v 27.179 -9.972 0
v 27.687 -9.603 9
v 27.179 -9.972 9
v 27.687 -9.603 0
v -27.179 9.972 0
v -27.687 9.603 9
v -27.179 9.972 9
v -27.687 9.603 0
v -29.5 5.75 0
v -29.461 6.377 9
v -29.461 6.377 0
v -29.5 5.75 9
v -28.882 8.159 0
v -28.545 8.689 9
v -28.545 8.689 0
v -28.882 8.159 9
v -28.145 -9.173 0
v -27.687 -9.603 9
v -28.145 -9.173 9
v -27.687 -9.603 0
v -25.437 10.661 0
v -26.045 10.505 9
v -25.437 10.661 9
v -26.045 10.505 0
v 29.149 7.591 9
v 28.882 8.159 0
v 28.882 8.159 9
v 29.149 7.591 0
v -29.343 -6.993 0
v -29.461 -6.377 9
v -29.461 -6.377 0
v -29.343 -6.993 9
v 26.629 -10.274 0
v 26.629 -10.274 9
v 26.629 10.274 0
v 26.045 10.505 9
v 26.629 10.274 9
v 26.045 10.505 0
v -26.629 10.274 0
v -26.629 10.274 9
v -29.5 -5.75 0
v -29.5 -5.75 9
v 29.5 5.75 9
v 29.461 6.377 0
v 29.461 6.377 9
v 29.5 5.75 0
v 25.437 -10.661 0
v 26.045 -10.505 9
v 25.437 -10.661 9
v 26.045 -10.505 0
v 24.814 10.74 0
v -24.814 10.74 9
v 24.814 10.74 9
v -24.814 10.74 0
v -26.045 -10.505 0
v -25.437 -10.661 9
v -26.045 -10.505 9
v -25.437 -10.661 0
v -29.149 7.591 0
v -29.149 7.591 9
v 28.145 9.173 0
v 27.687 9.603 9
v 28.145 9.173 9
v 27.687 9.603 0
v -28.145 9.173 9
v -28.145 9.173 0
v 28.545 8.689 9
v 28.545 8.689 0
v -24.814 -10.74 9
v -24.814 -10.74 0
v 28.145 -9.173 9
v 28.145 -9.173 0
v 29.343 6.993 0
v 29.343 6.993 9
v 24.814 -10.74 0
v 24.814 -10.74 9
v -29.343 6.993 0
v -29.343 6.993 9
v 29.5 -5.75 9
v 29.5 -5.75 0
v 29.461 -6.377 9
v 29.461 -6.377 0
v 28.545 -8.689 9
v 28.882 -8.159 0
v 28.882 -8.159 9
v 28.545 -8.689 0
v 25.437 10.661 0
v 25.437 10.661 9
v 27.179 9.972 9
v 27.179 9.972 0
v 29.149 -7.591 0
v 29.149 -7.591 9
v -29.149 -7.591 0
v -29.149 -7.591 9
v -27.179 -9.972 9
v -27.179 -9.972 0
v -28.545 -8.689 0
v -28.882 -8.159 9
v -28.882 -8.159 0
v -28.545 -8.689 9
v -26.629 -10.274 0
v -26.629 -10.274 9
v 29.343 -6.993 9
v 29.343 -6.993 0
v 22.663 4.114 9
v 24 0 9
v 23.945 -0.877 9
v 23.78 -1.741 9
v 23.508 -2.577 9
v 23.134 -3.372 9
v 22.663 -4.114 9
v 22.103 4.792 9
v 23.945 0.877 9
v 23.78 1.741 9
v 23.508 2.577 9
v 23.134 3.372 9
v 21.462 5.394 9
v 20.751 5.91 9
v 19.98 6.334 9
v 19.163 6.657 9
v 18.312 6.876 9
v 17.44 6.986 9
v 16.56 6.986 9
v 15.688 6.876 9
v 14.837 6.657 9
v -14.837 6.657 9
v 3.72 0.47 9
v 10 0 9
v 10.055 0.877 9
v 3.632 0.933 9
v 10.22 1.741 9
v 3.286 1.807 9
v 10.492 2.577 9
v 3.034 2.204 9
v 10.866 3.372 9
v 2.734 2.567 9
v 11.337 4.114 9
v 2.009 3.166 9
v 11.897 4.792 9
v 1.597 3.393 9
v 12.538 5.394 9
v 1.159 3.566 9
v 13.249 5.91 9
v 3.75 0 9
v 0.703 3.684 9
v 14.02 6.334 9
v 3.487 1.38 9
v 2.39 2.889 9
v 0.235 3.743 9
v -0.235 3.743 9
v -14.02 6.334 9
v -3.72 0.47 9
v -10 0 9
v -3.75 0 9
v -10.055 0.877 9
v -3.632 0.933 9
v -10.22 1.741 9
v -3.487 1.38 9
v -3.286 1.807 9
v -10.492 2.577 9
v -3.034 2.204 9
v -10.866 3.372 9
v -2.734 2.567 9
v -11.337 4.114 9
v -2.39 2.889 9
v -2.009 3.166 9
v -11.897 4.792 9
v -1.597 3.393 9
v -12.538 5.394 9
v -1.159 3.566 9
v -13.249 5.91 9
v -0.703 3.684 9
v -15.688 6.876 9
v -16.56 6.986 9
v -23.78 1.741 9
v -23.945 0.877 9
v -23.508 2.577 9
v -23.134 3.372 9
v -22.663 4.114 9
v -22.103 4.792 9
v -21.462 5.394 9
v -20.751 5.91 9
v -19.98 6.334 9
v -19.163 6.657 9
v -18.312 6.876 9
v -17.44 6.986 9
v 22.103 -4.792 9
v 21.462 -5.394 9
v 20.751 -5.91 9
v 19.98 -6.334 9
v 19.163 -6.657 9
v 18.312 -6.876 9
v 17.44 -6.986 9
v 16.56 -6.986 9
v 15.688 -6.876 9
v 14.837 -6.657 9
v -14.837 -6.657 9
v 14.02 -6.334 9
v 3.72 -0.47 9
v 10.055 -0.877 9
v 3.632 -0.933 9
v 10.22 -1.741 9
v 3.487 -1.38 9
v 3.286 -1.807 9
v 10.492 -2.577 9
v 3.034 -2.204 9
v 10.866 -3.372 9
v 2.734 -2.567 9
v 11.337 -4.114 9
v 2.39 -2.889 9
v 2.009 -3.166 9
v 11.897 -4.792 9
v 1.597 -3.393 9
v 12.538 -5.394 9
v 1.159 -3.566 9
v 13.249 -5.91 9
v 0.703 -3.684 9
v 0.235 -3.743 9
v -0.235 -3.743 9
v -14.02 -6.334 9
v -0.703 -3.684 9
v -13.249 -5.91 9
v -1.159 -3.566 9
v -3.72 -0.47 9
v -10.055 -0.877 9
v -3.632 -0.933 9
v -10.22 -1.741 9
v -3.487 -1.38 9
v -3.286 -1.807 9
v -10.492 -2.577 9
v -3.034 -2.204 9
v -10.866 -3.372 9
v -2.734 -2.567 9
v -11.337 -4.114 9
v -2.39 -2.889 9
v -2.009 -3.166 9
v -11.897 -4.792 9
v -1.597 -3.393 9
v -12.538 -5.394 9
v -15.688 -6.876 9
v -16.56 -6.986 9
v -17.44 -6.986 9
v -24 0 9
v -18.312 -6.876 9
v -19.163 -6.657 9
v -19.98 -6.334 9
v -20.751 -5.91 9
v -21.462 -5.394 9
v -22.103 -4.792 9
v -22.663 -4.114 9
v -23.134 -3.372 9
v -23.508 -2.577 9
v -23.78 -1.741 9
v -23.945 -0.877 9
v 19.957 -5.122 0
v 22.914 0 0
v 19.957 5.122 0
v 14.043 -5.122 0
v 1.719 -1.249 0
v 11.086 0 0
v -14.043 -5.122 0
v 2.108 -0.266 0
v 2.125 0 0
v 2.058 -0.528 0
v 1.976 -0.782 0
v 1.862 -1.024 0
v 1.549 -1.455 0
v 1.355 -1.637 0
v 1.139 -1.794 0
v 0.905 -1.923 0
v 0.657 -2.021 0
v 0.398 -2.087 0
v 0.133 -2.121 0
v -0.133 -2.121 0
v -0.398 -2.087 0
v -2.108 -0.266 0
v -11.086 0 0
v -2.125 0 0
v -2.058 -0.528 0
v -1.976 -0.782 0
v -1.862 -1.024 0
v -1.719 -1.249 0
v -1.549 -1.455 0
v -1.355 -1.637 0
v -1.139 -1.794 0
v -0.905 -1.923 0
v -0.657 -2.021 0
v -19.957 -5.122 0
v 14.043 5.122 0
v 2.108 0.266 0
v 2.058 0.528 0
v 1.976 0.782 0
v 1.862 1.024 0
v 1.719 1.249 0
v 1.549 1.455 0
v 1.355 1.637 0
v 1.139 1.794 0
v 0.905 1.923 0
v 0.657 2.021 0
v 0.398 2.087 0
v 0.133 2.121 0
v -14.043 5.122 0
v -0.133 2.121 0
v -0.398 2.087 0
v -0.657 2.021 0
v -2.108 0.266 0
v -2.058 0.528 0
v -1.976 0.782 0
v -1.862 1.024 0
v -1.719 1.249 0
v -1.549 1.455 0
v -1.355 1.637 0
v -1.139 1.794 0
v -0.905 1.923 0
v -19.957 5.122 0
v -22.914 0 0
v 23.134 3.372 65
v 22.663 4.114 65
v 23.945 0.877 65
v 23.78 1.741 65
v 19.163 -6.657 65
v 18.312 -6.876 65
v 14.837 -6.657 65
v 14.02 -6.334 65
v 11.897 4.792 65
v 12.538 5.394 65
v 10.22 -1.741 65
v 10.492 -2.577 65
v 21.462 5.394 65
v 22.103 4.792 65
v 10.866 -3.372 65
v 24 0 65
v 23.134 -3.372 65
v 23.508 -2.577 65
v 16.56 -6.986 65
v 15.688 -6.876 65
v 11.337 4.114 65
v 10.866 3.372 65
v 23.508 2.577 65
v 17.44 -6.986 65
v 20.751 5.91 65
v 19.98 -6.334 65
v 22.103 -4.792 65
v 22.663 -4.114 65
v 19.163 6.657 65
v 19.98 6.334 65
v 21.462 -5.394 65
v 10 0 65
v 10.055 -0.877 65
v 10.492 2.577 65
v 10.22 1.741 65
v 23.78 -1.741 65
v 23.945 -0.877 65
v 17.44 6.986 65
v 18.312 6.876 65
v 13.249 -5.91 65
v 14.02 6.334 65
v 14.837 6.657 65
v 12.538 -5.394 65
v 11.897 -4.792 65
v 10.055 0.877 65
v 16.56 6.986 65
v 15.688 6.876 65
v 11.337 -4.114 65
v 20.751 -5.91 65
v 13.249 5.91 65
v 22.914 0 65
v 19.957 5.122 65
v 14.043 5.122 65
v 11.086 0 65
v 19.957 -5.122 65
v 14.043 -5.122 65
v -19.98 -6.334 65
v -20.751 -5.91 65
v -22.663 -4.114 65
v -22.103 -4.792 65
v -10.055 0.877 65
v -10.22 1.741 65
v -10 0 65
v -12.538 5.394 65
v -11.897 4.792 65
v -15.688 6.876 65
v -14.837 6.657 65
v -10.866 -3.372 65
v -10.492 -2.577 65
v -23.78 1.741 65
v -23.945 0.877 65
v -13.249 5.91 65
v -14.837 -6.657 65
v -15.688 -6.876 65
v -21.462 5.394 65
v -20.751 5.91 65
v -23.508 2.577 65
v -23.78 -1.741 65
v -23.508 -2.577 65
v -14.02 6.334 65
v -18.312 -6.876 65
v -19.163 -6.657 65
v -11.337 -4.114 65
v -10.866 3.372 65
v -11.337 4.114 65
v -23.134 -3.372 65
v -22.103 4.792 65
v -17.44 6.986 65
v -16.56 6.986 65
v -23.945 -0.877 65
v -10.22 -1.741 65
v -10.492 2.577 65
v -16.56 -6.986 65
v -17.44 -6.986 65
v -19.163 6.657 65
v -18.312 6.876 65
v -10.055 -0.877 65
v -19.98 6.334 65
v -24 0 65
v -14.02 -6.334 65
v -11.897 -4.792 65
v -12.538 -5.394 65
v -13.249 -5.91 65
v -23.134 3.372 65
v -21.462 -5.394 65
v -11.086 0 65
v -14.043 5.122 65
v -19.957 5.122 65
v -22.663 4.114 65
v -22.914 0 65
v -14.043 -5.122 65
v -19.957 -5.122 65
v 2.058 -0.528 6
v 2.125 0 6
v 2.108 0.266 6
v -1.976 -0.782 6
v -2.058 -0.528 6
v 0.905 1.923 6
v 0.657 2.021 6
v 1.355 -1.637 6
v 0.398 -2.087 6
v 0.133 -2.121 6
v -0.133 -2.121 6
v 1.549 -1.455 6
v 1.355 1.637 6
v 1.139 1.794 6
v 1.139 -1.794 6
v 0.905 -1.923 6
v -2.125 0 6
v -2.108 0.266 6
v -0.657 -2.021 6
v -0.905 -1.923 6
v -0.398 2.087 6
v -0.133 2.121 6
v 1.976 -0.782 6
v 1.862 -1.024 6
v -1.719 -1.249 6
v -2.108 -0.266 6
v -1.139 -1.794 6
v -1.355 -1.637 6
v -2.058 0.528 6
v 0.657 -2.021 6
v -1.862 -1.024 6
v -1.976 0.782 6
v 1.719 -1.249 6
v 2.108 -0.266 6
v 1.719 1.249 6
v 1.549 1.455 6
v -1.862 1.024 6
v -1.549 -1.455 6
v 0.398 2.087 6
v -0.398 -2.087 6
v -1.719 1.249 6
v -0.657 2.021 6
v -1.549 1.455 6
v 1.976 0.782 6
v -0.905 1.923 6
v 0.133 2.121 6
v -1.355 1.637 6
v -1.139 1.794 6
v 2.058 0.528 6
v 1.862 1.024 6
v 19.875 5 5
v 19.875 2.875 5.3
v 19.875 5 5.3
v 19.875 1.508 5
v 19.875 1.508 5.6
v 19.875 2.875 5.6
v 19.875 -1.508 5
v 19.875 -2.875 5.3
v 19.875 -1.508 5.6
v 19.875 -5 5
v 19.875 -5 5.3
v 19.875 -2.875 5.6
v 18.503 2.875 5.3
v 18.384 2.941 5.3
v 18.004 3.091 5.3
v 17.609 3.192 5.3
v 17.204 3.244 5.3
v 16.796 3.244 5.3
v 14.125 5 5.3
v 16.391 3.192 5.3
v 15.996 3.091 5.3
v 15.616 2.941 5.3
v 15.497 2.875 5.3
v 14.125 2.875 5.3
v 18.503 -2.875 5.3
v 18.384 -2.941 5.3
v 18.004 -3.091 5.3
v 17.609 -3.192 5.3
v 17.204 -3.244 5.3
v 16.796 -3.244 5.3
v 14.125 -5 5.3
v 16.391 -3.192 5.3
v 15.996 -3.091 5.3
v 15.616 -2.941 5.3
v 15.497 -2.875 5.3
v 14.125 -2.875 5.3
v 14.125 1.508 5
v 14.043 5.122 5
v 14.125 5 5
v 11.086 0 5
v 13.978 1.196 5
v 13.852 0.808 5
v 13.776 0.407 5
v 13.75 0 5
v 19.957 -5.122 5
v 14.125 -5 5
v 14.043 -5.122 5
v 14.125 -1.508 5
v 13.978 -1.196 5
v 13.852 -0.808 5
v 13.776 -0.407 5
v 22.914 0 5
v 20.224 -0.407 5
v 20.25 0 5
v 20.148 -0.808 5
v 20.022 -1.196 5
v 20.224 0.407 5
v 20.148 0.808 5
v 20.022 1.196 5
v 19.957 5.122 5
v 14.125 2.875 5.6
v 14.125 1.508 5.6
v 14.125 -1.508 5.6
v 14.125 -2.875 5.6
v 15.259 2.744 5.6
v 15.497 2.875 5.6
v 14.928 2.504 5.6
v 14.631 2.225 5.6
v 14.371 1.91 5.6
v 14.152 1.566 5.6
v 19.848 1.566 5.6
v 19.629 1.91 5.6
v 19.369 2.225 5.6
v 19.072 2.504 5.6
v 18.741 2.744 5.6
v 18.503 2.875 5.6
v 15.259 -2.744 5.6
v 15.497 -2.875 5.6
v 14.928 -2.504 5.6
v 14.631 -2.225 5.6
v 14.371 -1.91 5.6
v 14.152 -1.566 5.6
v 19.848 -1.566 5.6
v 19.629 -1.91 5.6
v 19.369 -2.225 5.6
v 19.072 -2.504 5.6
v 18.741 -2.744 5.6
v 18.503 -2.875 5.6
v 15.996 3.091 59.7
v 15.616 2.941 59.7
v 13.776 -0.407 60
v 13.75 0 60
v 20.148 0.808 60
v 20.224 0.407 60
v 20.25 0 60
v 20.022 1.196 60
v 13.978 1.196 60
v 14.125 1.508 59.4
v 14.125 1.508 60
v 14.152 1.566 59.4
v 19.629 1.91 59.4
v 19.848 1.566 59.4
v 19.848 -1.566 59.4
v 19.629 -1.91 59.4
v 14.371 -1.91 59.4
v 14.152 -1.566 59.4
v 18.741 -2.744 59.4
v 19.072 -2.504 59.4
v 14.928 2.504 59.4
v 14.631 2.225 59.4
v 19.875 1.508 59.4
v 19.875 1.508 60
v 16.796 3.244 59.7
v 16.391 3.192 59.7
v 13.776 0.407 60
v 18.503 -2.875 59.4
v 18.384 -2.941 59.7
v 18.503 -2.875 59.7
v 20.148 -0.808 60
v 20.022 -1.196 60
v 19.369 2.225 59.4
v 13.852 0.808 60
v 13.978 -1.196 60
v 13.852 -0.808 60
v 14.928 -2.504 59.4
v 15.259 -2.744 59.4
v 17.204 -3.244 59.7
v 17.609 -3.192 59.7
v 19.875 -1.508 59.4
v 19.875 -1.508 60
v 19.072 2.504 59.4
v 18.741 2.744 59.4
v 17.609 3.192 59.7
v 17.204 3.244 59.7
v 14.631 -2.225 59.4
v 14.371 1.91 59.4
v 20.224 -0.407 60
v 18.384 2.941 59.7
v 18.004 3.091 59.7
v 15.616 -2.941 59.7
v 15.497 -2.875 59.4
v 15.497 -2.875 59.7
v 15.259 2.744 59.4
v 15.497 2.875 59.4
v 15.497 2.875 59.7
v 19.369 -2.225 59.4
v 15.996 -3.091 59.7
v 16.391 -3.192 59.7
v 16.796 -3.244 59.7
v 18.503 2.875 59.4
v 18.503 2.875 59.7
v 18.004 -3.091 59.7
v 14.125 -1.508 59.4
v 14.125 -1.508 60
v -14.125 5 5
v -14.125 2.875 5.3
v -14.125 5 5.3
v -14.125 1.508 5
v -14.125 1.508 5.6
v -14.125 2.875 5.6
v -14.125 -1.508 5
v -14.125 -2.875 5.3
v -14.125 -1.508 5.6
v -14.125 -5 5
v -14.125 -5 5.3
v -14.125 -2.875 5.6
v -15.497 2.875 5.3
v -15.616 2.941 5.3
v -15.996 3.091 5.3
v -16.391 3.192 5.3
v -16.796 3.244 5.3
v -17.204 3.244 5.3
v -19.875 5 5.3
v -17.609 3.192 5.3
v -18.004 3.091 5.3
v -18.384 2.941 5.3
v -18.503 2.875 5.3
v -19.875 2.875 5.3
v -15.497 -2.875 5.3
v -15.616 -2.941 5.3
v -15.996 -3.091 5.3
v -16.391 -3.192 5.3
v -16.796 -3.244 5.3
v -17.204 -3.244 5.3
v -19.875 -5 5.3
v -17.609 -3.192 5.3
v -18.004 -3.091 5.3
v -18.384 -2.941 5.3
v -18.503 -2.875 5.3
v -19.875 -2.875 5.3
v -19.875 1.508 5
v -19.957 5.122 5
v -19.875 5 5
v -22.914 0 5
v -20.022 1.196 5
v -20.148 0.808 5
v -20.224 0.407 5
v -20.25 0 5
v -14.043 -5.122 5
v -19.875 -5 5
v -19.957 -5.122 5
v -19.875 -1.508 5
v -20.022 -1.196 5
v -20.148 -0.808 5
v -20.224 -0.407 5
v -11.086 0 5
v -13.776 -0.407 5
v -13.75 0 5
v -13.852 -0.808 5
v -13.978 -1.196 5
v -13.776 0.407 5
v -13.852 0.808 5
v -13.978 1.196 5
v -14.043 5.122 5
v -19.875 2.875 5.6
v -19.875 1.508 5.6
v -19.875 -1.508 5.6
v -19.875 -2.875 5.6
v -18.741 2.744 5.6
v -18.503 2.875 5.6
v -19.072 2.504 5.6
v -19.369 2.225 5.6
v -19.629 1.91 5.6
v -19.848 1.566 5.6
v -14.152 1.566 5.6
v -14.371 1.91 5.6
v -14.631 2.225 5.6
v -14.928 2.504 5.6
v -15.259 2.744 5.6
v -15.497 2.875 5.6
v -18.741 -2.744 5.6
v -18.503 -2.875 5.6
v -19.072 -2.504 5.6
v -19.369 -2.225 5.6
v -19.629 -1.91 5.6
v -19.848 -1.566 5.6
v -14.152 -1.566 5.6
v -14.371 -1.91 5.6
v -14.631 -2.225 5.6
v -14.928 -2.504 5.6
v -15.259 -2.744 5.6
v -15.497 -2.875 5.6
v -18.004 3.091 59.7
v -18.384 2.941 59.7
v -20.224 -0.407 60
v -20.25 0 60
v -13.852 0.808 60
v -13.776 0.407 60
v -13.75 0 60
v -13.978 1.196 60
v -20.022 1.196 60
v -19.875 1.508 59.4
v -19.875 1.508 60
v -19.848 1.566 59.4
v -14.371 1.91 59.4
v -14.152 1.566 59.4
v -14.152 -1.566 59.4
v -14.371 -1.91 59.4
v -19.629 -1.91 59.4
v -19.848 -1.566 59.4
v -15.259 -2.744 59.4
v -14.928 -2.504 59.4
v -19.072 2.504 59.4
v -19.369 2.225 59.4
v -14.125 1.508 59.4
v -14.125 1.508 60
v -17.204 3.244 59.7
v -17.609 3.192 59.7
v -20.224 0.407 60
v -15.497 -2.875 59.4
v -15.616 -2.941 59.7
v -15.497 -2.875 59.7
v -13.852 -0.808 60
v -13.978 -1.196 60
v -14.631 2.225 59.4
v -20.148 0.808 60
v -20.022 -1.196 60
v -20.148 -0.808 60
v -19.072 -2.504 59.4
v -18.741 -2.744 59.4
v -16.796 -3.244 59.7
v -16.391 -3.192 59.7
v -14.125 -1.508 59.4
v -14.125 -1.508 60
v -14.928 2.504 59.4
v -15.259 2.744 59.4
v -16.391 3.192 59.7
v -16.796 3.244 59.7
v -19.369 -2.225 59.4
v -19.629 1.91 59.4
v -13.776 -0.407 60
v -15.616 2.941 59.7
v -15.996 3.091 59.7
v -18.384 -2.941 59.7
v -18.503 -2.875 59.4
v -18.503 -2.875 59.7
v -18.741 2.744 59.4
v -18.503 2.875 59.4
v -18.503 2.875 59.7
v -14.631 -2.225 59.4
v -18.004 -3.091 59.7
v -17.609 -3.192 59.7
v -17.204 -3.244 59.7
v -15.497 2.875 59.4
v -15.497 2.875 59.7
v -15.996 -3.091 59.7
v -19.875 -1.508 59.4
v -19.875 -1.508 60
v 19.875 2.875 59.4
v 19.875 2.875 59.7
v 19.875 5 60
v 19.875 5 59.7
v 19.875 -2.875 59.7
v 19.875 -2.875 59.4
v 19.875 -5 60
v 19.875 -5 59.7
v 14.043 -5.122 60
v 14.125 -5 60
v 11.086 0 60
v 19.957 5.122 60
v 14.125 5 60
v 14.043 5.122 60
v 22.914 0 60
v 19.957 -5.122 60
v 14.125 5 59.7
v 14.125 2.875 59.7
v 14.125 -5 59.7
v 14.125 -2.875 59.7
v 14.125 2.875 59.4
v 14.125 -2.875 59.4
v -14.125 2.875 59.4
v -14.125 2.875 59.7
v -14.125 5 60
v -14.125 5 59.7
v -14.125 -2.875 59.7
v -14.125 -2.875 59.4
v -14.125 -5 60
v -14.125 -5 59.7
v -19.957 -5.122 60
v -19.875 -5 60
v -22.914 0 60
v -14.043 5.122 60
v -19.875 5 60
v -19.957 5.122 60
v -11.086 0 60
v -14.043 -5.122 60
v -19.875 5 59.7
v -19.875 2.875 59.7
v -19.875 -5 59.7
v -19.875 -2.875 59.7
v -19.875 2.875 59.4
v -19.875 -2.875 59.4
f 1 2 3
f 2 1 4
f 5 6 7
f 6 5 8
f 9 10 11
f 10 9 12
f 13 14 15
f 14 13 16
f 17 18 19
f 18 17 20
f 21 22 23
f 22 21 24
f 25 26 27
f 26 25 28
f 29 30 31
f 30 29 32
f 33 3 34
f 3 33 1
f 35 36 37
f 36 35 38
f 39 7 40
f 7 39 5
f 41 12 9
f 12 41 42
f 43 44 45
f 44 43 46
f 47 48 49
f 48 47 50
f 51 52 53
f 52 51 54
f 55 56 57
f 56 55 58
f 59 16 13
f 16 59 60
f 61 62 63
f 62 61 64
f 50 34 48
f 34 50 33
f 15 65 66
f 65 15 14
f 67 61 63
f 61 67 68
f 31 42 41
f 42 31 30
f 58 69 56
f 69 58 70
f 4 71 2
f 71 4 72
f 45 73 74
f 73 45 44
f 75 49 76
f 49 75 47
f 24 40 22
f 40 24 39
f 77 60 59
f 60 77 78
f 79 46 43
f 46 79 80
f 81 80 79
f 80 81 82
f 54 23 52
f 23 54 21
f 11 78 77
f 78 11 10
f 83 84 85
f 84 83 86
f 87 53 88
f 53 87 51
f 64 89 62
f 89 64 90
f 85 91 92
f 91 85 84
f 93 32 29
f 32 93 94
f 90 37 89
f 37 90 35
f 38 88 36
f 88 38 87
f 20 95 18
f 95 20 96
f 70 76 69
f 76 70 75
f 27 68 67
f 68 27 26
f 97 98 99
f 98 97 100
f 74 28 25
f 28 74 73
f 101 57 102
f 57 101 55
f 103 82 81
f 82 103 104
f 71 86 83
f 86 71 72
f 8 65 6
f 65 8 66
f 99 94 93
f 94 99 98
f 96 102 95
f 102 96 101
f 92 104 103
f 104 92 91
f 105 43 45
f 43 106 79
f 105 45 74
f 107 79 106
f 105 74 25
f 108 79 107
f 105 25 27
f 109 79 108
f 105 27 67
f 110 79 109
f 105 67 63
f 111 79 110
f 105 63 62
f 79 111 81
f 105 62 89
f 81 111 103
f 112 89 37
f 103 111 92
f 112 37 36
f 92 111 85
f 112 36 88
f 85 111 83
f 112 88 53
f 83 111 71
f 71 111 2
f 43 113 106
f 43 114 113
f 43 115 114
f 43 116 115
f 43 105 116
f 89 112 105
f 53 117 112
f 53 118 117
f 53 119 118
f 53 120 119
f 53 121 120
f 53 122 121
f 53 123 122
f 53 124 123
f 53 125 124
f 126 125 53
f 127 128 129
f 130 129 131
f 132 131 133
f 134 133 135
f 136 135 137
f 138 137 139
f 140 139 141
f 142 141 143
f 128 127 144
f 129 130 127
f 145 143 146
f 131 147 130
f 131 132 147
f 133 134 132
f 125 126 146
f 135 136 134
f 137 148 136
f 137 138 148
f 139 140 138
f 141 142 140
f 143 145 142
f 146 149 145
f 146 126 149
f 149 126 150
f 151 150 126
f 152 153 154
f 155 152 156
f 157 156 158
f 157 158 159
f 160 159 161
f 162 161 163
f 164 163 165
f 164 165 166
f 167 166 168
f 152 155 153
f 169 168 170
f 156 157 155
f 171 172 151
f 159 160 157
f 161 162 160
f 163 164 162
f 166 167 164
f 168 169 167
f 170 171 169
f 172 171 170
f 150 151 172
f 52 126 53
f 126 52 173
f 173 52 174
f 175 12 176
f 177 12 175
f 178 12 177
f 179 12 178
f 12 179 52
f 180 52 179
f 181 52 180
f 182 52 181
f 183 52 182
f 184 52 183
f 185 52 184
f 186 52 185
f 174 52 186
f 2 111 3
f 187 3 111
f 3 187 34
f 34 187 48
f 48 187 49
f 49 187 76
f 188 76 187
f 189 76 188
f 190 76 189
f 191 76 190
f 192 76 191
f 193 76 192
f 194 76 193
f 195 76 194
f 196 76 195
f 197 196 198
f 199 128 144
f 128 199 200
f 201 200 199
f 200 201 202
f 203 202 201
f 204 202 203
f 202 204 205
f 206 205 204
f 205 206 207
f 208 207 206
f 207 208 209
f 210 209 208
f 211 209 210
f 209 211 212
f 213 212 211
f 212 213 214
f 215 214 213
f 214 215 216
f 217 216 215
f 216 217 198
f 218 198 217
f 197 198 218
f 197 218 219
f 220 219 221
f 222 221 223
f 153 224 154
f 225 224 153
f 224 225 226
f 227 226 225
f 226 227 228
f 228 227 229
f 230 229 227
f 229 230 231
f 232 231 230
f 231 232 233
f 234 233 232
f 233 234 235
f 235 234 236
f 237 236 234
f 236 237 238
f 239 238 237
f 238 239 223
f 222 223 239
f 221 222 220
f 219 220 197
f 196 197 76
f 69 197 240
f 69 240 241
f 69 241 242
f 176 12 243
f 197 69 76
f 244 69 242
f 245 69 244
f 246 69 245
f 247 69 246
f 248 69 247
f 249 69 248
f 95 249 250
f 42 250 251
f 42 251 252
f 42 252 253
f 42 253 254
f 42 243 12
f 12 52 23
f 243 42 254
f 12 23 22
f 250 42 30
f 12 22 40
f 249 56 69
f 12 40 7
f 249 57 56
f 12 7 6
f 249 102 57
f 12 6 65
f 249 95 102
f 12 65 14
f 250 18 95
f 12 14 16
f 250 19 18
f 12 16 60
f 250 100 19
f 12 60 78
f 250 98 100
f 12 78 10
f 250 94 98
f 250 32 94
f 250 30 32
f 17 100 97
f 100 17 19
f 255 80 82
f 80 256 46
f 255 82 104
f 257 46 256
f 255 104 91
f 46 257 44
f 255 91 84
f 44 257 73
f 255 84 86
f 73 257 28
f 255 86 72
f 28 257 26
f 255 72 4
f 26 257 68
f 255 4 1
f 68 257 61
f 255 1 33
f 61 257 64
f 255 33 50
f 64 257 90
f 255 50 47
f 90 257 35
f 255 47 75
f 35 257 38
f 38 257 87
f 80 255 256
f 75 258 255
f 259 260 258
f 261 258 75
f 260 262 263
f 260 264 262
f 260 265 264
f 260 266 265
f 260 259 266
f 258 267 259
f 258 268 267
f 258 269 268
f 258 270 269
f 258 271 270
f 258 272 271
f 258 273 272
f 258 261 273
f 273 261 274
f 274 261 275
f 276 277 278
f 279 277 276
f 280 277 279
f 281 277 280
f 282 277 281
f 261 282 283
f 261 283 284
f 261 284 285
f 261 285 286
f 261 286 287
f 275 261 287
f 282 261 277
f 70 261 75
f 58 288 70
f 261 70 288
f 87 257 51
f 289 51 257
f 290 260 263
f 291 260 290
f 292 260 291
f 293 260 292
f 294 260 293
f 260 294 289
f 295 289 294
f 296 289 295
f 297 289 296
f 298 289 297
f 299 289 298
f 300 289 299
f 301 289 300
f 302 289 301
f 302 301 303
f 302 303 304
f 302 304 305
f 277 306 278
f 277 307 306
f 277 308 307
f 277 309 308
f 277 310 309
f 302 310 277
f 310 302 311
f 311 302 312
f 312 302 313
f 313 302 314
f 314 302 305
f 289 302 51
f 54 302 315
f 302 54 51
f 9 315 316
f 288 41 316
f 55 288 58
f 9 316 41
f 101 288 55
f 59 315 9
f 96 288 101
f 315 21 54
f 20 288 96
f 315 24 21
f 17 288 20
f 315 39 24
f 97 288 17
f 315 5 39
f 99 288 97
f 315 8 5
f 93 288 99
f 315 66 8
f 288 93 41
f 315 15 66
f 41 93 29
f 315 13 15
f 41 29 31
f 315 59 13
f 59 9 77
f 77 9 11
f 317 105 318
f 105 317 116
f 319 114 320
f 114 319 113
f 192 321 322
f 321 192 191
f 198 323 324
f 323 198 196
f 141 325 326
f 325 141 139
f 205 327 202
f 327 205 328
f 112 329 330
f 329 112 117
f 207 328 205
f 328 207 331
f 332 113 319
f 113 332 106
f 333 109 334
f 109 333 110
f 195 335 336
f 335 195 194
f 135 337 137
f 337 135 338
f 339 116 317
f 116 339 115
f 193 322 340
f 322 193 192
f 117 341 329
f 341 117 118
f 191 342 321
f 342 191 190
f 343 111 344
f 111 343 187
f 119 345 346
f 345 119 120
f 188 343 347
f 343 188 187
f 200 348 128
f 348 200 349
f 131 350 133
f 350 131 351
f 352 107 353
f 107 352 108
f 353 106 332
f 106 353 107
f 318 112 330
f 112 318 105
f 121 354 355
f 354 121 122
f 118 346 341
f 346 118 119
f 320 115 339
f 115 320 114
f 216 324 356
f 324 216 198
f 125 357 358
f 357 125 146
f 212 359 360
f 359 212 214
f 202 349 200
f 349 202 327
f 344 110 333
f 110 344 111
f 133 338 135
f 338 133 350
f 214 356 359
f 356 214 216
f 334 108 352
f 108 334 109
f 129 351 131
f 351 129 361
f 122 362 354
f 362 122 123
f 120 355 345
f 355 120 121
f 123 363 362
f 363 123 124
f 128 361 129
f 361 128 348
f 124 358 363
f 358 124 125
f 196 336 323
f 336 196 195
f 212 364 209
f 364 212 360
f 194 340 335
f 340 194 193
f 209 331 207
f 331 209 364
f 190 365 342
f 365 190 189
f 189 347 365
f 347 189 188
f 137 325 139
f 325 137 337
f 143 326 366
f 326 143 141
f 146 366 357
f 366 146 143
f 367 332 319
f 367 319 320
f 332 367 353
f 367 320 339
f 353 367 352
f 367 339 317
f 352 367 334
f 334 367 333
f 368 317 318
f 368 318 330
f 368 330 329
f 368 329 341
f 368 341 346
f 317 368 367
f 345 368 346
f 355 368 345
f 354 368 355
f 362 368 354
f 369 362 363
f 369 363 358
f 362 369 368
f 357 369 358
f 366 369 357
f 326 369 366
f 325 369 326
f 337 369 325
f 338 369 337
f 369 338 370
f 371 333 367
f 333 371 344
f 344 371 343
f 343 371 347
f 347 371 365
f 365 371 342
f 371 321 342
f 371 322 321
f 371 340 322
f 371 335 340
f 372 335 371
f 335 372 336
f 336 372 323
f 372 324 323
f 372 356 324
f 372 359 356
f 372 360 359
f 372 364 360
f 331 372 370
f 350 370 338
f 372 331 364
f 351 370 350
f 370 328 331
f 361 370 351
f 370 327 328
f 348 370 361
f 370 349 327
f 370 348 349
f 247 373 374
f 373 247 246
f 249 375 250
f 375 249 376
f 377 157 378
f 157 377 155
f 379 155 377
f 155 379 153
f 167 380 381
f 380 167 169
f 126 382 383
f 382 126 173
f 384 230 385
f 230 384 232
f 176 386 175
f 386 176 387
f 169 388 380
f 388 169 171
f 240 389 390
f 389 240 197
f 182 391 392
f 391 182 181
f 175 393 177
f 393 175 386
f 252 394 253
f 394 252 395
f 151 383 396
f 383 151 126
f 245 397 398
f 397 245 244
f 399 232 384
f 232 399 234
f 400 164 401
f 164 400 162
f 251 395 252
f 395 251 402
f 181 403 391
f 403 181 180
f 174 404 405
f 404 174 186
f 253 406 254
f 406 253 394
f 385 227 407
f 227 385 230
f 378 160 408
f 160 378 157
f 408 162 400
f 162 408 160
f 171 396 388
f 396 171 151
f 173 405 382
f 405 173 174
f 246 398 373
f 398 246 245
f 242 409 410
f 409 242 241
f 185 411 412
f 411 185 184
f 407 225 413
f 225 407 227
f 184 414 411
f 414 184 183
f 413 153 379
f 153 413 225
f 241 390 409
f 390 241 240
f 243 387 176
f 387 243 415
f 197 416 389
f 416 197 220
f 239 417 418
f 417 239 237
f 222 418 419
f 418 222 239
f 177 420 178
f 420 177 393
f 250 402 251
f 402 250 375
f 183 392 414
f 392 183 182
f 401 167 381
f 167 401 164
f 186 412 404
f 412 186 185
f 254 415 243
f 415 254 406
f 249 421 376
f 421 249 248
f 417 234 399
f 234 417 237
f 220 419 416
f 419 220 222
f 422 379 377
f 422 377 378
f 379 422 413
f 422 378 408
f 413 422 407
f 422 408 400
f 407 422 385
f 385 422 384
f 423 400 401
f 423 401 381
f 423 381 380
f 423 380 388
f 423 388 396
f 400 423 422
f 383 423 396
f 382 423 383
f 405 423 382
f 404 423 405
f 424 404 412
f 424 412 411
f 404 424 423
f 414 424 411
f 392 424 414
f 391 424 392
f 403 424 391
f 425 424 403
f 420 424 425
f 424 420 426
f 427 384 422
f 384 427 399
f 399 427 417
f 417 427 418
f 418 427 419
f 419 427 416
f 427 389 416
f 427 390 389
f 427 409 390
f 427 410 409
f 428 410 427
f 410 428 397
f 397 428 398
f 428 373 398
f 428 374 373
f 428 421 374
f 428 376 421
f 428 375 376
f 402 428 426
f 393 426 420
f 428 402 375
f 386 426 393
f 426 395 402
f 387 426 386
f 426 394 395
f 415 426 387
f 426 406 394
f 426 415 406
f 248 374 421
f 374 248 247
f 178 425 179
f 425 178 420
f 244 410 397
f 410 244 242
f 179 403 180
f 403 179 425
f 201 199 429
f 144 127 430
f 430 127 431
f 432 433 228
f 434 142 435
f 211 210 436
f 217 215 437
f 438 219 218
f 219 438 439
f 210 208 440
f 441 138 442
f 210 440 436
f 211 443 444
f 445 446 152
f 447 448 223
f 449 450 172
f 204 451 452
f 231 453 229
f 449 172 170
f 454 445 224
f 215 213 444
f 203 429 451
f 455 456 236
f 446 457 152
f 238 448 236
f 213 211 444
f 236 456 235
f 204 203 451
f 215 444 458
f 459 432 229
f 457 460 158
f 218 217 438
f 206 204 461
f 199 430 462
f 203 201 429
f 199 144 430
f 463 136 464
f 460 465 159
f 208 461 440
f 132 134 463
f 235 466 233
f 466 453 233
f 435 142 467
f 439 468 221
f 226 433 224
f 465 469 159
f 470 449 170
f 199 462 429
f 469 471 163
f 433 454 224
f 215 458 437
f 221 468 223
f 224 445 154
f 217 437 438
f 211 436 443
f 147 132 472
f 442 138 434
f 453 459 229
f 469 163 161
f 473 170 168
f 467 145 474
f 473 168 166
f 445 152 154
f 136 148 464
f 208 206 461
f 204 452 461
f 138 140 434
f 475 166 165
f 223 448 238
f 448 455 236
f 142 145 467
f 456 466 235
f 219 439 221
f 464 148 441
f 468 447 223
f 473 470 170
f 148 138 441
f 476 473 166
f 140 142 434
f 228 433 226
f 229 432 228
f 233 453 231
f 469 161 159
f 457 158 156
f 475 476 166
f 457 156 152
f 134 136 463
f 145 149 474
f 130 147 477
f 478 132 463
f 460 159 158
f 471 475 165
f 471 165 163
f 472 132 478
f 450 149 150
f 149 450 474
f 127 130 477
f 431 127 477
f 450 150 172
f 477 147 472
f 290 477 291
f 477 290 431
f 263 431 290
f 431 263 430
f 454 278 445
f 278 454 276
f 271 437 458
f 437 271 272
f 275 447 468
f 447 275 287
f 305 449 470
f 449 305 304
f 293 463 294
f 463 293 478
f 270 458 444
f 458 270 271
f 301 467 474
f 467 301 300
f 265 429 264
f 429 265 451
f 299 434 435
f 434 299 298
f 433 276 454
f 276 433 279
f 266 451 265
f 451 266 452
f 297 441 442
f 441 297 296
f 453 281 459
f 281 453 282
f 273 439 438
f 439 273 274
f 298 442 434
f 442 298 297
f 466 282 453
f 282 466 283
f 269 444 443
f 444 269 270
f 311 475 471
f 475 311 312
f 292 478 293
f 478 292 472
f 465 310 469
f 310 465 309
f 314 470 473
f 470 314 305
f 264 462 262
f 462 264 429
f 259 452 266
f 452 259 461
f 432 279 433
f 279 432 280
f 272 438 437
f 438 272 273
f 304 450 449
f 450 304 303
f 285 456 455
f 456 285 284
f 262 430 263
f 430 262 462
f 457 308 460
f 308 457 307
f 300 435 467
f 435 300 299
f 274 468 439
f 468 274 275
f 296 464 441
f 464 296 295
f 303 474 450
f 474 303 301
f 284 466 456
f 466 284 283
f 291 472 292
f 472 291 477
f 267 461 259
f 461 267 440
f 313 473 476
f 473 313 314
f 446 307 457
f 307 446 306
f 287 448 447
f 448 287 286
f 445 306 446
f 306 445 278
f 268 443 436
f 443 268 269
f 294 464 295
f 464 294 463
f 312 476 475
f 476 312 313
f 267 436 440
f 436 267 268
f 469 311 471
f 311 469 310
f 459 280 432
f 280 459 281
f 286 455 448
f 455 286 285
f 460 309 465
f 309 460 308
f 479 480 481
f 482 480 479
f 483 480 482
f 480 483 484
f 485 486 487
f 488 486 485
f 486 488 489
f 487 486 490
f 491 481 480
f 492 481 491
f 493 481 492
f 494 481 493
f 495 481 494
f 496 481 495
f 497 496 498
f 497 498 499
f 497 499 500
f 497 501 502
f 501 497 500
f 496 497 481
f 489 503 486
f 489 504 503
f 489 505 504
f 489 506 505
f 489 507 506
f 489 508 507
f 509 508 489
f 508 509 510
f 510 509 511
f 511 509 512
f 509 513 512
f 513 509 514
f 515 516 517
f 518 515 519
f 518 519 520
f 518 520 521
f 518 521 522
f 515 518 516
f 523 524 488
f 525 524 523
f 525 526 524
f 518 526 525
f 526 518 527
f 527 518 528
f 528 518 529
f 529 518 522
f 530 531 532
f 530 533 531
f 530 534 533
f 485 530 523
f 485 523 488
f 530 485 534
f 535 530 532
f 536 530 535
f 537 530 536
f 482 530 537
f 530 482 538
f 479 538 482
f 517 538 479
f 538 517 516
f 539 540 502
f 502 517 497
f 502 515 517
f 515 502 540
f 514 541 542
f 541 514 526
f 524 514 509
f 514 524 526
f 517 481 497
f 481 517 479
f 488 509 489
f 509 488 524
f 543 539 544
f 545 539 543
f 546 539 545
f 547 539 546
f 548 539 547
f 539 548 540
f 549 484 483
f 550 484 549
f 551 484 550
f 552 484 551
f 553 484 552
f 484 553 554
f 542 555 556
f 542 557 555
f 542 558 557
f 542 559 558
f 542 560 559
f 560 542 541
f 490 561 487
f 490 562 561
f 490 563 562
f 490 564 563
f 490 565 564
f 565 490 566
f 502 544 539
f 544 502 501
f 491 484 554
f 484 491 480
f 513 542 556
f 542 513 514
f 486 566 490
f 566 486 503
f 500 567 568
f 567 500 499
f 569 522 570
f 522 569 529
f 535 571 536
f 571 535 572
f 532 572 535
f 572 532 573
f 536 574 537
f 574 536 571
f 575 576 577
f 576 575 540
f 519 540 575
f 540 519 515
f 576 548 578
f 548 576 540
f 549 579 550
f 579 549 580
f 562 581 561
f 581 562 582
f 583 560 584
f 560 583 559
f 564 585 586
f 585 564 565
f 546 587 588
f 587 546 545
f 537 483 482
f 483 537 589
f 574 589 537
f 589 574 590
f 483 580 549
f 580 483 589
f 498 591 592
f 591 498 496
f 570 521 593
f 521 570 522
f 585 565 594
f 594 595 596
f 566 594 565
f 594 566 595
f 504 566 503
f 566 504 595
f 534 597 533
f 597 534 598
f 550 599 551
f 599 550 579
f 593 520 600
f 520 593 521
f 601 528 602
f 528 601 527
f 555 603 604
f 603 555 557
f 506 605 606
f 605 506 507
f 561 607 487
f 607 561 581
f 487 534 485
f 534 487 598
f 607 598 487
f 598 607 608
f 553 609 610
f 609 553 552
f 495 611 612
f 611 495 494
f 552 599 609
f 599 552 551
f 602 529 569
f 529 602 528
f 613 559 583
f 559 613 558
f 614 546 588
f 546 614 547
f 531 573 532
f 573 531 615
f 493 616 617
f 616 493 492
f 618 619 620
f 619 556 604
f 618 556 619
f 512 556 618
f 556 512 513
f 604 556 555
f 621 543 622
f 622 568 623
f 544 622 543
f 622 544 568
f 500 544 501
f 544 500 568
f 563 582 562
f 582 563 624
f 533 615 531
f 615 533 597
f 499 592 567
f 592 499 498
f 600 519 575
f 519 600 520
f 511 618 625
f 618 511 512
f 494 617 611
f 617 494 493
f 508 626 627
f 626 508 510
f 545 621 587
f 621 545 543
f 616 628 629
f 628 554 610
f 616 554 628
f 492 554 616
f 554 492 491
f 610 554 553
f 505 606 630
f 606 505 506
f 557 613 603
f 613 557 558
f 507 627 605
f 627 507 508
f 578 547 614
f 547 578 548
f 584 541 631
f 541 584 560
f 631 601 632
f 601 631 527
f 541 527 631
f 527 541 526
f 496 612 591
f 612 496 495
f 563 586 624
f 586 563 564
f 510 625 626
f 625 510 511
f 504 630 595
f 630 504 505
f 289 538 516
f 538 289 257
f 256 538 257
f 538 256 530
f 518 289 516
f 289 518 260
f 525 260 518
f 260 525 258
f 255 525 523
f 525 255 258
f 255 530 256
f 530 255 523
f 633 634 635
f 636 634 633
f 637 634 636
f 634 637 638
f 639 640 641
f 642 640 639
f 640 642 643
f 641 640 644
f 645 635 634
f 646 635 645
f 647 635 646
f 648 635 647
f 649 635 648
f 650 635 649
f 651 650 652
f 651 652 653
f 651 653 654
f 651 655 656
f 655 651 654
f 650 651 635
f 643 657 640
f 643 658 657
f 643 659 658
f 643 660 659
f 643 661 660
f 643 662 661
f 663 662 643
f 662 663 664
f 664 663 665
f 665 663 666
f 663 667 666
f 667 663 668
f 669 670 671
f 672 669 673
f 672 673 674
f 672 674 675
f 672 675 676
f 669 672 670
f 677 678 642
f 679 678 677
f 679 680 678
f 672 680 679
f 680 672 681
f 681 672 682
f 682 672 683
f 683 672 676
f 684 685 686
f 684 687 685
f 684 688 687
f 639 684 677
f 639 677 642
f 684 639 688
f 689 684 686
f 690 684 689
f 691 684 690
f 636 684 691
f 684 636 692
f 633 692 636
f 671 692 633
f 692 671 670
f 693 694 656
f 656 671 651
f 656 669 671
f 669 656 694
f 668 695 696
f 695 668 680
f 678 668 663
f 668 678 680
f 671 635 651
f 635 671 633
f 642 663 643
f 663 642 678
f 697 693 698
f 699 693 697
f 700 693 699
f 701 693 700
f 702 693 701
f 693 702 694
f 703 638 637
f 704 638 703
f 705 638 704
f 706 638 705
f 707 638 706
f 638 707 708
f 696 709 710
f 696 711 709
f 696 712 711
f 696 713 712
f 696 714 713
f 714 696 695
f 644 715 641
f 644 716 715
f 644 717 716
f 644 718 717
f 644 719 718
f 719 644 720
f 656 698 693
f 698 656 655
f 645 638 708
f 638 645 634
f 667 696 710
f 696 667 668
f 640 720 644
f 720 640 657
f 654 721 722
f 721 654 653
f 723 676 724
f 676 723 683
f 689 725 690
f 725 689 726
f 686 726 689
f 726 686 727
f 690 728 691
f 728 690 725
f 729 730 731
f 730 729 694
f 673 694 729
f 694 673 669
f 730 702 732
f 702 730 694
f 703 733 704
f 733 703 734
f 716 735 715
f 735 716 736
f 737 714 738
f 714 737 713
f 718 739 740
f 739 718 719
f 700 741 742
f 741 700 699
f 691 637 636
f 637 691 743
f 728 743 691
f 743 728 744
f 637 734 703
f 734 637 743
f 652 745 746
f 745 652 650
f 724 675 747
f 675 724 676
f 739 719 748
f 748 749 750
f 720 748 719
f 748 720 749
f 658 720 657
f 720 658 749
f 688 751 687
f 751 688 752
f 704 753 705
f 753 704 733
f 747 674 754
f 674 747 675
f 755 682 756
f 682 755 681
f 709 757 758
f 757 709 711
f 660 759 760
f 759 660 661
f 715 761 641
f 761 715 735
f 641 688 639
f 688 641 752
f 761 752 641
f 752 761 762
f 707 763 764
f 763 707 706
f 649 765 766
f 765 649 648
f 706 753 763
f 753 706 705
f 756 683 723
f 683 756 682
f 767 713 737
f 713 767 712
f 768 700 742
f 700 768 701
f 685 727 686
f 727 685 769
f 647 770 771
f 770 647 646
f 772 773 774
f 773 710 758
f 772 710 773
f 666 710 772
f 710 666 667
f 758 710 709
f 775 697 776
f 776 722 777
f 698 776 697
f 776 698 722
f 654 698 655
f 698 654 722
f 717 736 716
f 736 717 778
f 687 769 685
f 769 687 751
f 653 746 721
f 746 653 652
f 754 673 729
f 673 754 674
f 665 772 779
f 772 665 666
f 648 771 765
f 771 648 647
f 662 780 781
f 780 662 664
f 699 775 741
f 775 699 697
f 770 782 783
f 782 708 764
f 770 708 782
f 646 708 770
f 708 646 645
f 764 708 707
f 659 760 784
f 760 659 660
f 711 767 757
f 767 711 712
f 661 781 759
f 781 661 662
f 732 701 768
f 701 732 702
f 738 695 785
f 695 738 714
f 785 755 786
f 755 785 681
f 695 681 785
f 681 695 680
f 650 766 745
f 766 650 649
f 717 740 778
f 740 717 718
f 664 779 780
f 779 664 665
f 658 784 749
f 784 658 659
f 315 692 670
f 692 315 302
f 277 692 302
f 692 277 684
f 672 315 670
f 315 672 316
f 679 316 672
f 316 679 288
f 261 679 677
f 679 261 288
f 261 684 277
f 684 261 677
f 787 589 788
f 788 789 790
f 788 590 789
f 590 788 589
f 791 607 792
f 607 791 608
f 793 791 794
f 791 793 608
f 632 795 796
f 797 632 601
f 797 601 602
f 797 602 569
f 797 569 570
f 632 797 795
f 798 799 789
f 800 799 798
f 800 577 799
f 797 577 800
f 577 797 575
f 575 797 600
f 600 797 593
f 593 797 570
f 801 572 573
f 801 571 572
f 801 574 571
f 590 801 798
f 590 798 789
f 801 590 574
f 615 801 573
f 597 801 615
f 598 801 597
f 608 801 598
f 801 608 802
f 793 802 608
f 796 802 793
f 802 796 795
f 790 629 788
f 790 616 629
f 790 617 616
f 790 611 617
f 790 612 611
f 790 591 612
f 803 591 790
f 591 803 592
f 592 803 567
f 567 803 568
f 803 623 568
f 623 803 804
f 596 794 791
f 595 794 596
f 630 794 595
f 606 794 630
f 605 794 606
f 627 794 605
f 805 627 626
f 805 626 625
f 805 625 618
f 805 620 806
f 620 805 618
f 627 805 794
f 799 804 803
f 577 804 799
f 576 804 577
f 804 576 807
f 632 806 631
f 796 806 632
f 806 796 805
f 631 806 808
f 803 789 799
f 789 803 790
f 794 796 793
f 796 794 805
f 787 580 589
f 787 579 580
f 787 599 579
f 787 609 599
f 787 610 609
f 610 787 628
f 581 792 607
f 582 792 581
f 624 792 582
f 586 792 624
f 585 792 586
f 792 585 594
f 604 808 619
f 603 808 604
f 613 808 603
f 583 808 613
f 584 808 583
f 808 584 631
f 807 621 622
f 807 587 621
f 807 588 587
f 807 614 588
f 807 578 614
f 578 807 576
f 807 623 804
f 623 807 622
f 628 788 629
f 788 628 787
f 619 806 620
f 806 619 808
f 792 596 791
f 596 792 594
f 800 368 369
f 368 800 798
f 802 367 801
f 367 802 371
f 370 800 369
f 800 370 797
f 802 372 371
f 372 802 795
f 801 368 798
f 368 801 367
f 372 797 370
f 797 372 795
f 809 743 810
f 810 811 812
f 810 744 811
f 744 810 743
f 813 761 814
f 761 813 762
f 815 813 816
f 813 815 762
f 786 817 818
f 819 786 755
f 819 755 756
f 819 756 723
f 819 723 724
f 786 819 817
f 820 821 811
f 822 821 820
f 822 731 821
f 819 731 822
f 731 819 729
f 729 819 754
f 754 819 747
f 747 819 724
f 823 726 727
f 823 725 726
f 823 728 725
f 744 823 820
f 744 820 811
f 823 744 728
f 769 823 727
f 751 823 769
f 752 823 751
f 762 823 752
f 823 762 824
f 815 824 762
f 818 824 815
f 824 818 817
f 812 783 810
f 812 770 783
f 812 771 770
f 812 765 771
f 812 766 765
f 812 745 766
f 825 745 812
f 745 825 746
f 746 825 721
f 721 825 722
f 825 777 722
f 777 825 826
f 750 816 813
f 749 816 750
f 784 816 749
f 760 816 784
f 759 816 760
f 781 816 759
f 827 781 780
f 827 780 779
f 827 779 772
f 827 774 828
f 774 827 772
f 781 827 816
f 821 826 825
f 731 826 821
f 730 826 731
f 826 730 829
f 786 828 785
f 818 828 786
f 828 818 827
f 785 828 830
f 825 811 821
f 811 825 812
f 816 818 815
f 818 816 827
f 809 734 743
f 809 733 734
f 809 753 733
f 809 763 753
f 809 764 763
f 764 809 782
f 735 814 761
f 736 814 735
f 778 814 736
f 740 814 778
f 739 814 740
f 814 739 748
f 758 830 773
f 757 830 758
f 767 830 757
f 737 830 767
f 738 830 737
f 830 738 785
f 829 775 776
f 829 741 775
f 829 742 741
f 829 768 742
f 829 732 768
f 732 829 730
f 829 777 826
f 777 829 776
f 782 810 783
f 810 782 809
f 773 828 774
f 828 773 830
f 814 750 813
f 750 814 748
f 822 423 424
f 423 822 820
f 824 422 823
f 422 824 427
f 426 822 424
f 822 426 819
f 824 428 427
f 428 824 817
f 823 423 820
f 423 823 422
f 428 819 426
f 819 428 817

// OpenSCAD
$fn = 50;


difference() {
	union() {
		hull() {
			translate(v = [-24.5000000000, 5.7500000000, 0]) {
				cylinder(h = 9, r = 5);
			}
			translate(v = [24.5000000000, 5.7500000000, 0]) {
				cylinder(h = 9, r = 5);
			}
			translate(v = [-24.5000000000, -5.7500000000, 0]) {
				cylinder(h = 9, r = 5);
			}
			translate(v = [24.5000000000, -5.7500000000, 0]) {
				cylinder(h = 9, r = 5);
			}
		}
		translate(v = [17.0000000000, 0, 0.0000000000]) {
			cylinder(h = 65, r = 7.0000000000);
		}
		translate(v = [-17.0000000000, 0, 0.0000000000]) {
			cylinder(h = 65, r = 7.0000000000);
		}
		translate(v = [17.0000000000, 0, 59.0000000000]) {
			cylinder(h = 6, r = 7.0000000000);
		}
		translate(v = [-17.0000000000, 0, 59.0000000000]) {
			cylinder(h = 6, r = 7.0000000000);
		}
	}
	union() {
		translate(v = [0, 0, 9]) {
			rotate(a = [0, 0, 0]) {
				difference() {
					union() {
						#translate(v = [0, 0, -60.0000000000]) {
							cylinder(h = 60, r = 2.0000000000);
						}
						#translate(v = [0, 0, -3]) {
							cylinder(h = 3, r1 = 2.1250000000, r2 = 3.7500000000);
						}
						#translate(v = [0, 0, -60.0000000000]) {
							cylinder(h = 60, r = 2.1250000000);
						}
						#translate(v = [0, 0, -60.0000000000]) {
							cylinder(h = 60, r = 2.0000000000);
						}
					}
					union();
				}
			}
		}
		translate(v = [17.0000000000, 0, 0]) {
			rotate(a = [0, 0, 0]) {
				difference() {
					union() {
						#translate(v = [-2.8750000000, -5.0000000000, -0.3000000000]) {
							cube(size = [5.7500000000, 10, 0.3000000000]);
						}
						#translate(v = [-2.8750000000, -2.8750000000, -0.6000000000]) {
							cube(size = [5.7500000000, 5.7500000000, 0.3000000000]);
						}
						#translate(v = [-2.8750000000, -5.0000000000, 5]) {
							cube(size = [5.7500000000, 10, 0.3000000000]);
						}
						#translate(v = [-2.8750000000, -2.8750000000, 5.3000000000]) {
							cube(size = [5.7500000000, 5.7500000000, 0.3000000000]);
						}
						#translate(v = [0, 0, -100.0000000000]) {
							cylinder(h = 200, r = 3.2500000000);
						}
						#linear_extrude(height = 5) {
							polygon(points = [[5.9142500000, 0.0000000000], [2.9571250000, 5.1218907443], [-2.9571250000, 5.1218907443], [-5.9142500000, 0.0000000000], [-2.9571250000, -5.1218907443], [2.9571250000, -5.1218907443]]);
						}
						#translate(v = [-2.8750000000, -5.0000000000, -0.3000000000]) {
							cube(size = [5.7500000000, 10, 0.3000000000]);
						}
						#translate(v = [-2.8750000000, -2.8750000000, -0.6000000000]) {
							cube(size = [5.7500000000, 5.7500000000, 0.3000000000]);
						}
						#translate(v = [-2.8750000000, -5.0000000000, 5]) {
							cube(size = [5.7500000000, 10, 0.3000000000]);
						}
						#translate(v = [-2.8750000000, -2.8750000000, 5.3000000000]) {
							cube(size = [5.7500000000, 5.7500000000, 0.3000000000]);
						}
						#translate(v = [0, 0, -100.0000000000]) {
							cylinder(h = 200, r = 3.2500000000);
						}
						#translate(v = [-2.8750000000, -5.0000000000, -0.3000000000]) {
							cube(size = [5.7500000000, 10, 0.3000000000]);
						}
						#translate(v = [-2.8750000000, -2.8750000000, -0.6000000000]) {
							cube(size = [5.7500000000, 5.7500000000, 0.3000000000]);
						}
						#translate(v = [-2.8750000000, -5.0000000000, 5]) {
							cube(size = [5.7500000000, 10, 0.3000000000]);
						}
						#translate(v = [-2.8750000000, -2.8750000000, 5.3000000000]) {
							cube(size = [5.7500000000, 5.7500000000, 0.3000000000]);
						}
						#translate(v = [0, 0, -100.0000000000]) {
							cylinder(h = 200, r = 3.2500000000);
						}
					}
					union();
				}
			}
		}
		translate(v = [-17.0000000000, 0, 0]) {
			rotate(a = [0, 0, 0]) {
				difference() {
					union() {
						#translate(v = [-2.8750000000, -5.0000000000, -0.3000000000]) {
							cube(size = [5.7500000000, 10, 0.3000000000]);
						}
						#translate(v = [-2.8750000000, -2.8750000000, -0.6000000000]) {
							cube(size = [5.7500000000, 5.7500000000, 0.3000000000]);
						}
						#translate(v = [-2.8750000000, -5.0000000000, 5]) {
							cube(size = [5.7500000000, 10, 0.3000000000]);
						}
						#translate(v = [-2.8750000000, -2.8750000000, 5.3000000000]) {
							cube(size = [5.7500000000, 5.7500000000, 0.3000000000]);
						}
						#translate(v = [0, 0, -100.0000000000]) {
							cylinder(h = 200, r = 3.2500000000);
						}
						#linear_extrude(height = 5) {
							polygon(points = [[5.9142500000, 0.0000000000], [2.9571250000, 5.1218907443], [-2.9571250000, 5.1218907443], [-5.9142500000, 0.0000000000], [-2.9571250000, -5.1218907443], [2.9571250000, -5.1218907443]]);
						}
						#translate(v = [-2.8750000000, -5.0000000000, -0.3000000000]) {
							cube(size = [5.7500000000, 10, 0.3000000000]);
						}
						#translate(v = [-2.8750000000, -2.8750000000, -0.6000000000]) {
							cube(size = [5.7500000000, 5.7500000000, 0.3000000000]);
						}
						#translate(v = [-2.8750000000, -5.0000000000, 5]) {
							cube(size = [5.7500000000, 10, 0.3000000000]);
						}
						#translate(v = [-2.8750000000, -2.8750000000, 5.3000000000]) {
							cube(size = [5.7500000000, 5.7500000000, 0.3000000000]);
						}
						#translate(v = [0, 0, -100.0000000000]) {
							cylinder(h = 200, r = 3.2500000000);
						}
						#translate(v = [-2.8750000000, -5.0000000000, -0.3000000000]) {
							cube(size = [5.7500000000, 10, 0.3000000000]);
						}
						#translate(v = [-2.8750000000, -2.8750000000, -0.6000000000]) {
							cube(size = [5.7500000000, 5.7500000000, 0.3000000000]);
						}
						#translate(v = [-2.8750000000, -5.0000000000, 5]) {
							cube(size = [5.7500000000, 10, 0.3000000000]);
						}
						#translate(v = [-2.8750000000, -2.8750000000, 5.3000000000]) {
							cube(size = [5.7500000000, 5.7500000000, 0.3000000000]);
						}
						#translate(v = [0, 0, -100.0000000000]) {
							cylinder(h = 200, r = 3.2500000000);
						}
					}
					union();
				}
			}
		}
		translate(v = [17.0000000000, 0, 65]) {
			rotate(a = [0, 0, 0]) {
				difference() {
					union() {
						#translate(v = [-2.8750000000, -5.0000000000, -5.3000000000]) {
							cube(size = [5.7500000000, 10, 0.3000000000]);
						}
						#translate(v = [-2.8750000000, -2.8750000000, -5.6000000000]) {
							cube(size = [5.7500000000, 5.7500000000, 0.3000000000]);
						}
						#translate(v = [-2.8750000000, -5.0000000000, 0]) {
							cube(size = [5.7500000000, 10, 0.3000000000]);
						}
						#translate(v = [-2.8750000000, -2.8750000000, 0.3000000000]) {
							cube(size = [5.7500000000, 5.7500000000, 0.3000000000]);
						}
						#translate(v = [0, 0, -100.0000000000]) {
							cylinder(h = 200, r = 3.2500000000);
						}
						translate(v = [0, 0, -5]) {
							#linear_extrude(height = 5) {
								polygon(points = [[5.9142500000, 0.0000000000], [2.9571250000, 5.1218907443], [-2.9571250000, 5.1218907443], [-5.9142500000, 0.0000000000], [-2.9571250000, -5.1218907443], [2.9571250000, -5.1218907443]]);
							}
						}
						#translate(v = [-2.8750000000, -5.0000000000, -5.3000000000]) {
							cube(size = [5.7500000000, 10, 0.3000000000]);
						}
						#translate(v = [-2.8750000000, -2.8750000000, -5.6000000000]) {
							cube(size = [5.7500000000, 5.7500000000, 0.3000000000]);
						}
						#translate(v = [-2.8750000000, -5.0000000000, 0]) {
							cube(size = [5.7500000000, 10, 0.3000000000]);
						}
						#translate(v = [-2.8750000000, -2.8750000000, 0.3000000000]) {
							cube(size = [5.7500000000, 5.7500000000, 0.3000000000]);
						}
						#translate(v = [0, 0, -100.0000000000]) {
							cylinder(h = 200, r = 3.2500000000);
						}
						#translate(v = [-2.8750000000, -5.0000000000, -5.3000000000]) {
							cube(size = [5.7500000000, 10, 0.3000000000]);
						}
						#translate(v = [-2.8750000000, -2.8750000000, -5.6000000000]) {
							cube(size = [5.7500000000, 5.7500000000, 0.3000000000]);
						}
						#translate(v = [-2.8750000000, -5.0000000000, 0]) {
							cube(size = [5.7500000000, 10, 0.3000000000]);
						}
						#translate(v = [-2.8750000000, -2.8750000000, 0.3000000000]) {
							cube(size = [5.7500000000, 5.7500000000, 0.3000000000]);
						}
						#translate(v = [0, 0, -100.0000000000]) {
							cylinder(h = 200, r = 3.2500000000);
						}
					}
					union();
				}
			}
		}
		translate(v = [-17.0000000000, 0, 65]) {
			rotate(a = [0, 0, 0]) {
				difference() {
					union() {
						#translate(v = [-2.8750000000, -5.0000000000, -5.3000000000]) {
							cube(size = [5.7500000000, 10, 0.3000000000]);
						}
						#translate(v = [-2.8750000000, -2.8750000000, -5.6000000000]) {
							cube(size = [5.7500000000, 5.7500000000, 0.3000000000]);
						}
						#translate(v = [-2.8750000000, -5.0000000000, 0]) {
							cube(size = [5.7500000000, 10, 0.3000000000]);
						}
						#translate(v = [-2.8750000000, -2.8750000000, 0.3000000000]) {
							cube(size = [5.7500000000, 5.7500000000, 0.3000000000]);
						}
						#translate(v = [0, 0, -100.0000000000]) {
							cylinder(h = 200, r = 3.2500000000);
						}
						translate(v = [0, 0, -5]) {
							#linear_extrude(height = 5) {
								polygon(points = [[5.9142500000, 0.0000000000], [2.9571250000, 5.1218907443], [-2.9571250000, 5.1218907443], [-5.9142500000, 0.0000000000], [-2.9571250000, -5.1218907443], [2.9571250000, -5.1218907443]]);
							}
						}
						#translate(v = [-2.8750000000, -5.0000000000, -5.3000000000]) {
							cube(size = [5.7500000000, 10, 0.3000000000]);
						}
						#translate(v = [-2.8750000000, -2.8750000000, -5.6000000000]) {
							cube(size = [5.7500000000, 5.7500000000, 0.3000000000]);
						}
						#translate(v = [-2.8750000000, -5.0000000000, 0]) {
							cube(size = [5.7500000000, 10, 0.3000000000]);
						}
						#translate(v = [-2.8750000000, -2.8750000000, 0.3000000000]) {
							cube(size = [5.7500000000, 5.7500000000, 0.3000000000]);
						}
						#translate(v = [0, 0, -100.0000000000]) {
							cylinder(h = 200, r = 3.2500000000);
						}
						#translate(v = [-2.8750000000, -5.0000000000, -5.3000000000]) {
							cube(size = [5.7500000000, 10, 0.3000000000]);
						}
						#translate(v = [-2.8750000000, -2.8750000000, -5.6000000000]) {
							cube(size = [5.7500000000, 5.7500000000, 0.3000000000]);
						}
						#translate(v = [-2.8750000000, -5.0000000000, 0]) {
							cube(size = [5.7500000000, 10, 0.3000000000]);
						}
						#translate(v = [-2.8750000000, -2.8750000000, 0.3000000000]) {
							cube(size = [5.7500000000, 5.7500000000, 0.3000000000]);
						}
						#translate(v = [0, 0, -100.0000000000]) {
							cylinder(h = 200, r = 3.2500000000);
						}
					}
					union();
				}
			}
		}
	}
}
